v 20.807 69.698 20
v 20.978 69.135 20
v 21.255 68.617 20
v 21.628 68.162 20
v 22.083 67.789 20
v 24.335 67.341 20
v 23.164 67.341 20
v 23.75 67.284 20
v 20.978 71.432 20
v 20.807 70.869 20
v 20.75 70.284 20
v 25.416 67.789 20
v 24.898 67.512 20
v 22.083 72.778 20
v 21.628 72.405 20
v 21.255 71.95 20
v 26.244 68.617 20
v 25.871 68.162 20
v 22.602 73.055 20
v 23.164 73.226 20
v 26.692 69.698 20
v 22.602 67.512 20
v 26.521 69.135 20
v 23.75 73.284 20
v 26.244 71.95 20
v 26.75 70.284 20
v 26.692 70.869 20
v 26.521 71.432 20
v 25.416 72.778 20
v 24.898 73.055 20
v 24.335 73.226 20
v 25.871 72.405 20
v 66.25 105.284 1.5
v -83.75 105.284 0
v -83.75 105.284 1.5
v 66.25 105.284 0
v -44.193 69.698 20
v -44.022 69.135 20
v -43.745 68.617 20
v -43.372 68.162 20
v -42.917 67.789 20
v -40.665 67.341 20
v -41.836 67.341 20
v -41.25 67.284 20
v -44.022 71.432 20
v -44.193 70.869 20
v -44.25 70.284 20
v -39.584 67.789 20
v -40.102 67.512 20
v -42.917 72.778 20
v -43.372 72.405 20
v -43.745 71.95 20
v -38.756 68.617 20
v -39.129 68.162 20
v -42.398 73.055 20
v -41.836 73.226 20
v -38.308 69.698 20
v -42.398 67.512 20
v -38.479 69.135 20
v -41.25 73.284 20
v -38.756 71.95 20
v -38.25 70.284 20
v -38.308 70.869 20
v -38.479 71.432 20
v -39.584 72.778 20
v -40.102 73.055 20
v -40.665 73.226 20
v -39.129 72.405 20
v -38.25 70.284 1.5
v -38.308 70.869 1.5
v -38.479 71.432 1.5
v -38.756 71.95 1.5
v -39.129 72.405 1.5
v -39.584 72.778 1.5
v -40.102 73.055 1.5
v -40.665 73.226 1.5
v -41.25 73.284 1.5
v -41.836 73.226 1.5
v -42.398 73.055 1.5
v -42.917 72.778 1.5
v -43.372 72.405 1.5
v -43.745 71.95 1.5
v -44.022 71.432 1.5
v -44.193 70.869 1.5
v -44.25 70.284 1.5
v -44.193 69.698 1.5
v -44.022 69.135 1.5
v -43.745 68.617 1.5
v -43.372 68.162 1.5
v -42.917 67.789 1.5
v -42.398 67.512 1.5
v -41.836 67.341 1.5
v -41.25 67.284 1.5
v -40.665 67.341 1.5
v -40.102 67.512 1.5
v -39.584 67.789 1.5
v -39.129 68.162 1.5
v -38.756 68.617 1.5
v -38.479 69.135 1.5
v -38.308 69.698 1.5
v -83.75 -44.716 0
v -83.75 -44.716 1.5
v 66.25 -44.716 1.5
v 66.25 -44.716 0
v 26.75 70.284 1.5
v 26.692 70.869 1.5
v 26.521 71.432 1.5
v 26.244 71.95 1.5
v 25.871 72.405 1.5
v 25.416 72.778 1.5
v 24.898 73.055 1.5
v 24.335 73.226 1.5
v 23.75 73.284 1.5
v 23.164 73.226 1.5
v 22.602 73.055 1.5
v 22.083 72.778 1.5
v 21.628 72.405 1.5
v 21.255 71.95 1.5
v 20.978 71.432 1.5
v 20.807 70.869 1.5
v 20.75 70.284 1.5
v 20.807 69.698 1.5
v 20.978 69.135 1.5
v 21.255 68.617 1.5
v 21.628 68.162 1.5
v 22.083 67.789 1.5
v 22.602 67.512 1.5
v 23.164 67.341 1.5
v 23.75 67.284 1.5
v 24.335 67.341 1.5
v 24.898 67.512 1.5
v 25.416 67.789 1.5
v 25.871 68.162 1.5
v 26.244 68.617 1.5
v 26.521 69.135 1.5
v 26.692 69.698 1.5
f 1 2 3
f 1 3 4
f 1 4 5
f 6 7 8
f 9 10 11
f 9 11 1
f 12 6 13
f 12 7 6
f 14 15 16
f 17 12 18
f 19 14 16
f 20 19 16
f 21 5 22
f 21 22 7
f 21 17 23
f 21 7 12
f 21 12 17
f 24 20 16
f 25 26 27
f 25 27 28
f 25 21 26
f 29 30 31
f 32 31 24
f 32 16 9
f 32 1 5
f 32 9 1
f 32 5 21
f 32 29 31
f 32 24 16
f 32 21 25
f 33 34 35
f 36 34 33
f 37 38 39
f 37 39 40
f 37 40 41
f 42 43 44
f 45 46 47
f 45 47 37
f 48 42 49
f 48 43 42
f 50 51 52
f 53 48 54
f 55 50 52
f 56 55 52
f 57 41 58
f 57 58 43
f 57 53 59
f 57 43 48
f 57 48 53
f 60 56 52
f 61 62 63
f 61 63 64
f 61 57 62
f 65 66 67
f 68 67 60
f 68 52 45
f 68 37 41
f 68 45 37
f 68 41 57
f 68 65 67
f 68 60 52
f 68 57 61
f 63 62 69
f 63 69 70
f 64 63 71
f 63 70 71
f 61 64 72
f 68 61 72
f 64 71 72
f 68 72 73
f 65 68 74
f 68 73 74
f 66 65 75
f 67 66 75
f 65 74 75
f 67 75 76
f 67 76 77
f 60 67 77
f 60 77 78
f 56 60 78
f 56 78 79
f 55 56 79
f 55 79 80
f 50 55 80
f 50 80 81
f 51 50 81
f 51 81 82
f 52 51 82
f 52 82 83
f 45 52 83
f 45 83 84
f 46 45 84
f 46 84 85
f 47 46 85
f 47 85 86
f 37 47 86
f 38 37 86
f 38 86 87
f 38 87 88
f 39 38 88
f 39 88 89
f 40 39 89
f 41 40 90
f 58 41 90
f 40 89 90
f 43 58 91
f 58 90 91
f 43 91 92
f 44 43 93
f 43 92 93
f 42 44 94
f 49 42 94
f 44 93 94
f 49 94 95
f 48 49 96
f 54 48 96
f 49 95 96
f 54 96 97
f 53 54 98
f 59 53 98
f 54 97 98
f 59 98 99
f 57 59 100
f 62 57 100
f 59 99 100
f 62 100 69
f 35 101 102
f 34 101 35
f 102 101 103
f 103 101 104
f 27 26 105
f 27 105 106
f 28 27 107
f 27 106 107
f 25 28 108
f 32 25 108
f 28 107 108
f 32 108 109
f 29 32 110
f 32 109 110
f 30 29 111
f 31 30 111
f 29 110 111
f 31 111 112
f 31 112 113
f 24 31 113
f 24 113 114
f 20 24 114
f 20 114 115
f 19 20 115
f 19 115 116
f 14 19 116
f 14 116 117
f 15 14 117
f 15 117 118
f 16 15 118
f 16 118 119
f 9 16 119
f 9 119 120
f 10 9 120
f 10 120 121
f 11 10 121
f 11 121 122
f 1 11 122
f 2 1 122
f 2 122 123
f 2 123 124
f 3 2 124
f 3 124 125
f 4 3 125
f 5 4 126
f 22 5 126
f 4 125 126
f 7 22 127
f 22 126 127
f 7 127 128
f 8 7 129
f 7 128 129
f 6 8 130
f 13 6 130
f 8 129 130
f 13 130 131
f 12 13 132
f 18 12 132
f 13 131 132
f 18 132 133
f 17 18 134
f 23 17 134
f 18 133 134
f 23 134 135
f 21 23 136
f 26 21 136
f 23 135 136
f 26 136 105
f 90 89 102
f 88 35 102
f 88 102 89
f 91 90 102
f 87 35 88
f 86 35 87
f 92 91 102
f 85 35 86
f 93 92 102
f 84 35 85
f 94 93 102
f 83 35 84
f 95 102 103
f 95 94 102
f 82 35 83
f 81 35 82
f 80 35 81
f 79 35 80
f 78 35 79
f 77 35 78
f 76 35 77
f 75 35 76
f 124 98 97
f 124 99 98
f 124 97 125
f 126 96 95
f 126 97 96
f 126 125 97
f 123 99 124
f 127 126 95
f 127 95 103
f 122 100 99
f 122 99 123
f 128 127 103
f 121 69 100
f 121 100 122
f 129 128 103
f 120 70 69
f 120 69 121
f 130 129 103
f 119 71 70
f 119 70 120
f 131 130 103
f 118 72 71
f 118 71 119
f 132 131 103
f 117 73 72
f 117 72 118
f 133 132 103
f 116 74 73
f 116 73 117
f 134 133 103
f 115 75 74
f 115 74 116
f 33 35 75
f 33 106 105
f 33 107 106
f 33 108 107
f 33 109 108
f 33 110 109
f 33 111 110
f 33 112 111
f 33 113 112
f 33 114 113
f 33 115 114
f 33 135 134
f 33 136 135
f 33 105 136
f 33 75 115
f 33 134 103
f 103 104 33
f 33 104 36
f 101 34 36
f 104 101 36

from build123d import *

# Parameters (mm, degrees)
F0_W     = 150
F0_H     = 150
F0_R     = 3
F1_DEPTH = 1.5
F2_DEPTH = 20


with BuildPart() as f1:
    # F0 (on Top) → F1 (new body)
    with BuildSketch(Plane.XY):
        with Locations((-8.750431, 30.283519)):
            Rectangle(F0_W, F0_H)
        with Locations((-41.250431, 70.283519)):
            Circle(F0_R, mode=Mode.SUBTRACT)
        with Locations((23.749569, 70.283519)):
            Circle(F0_R, mode=Mode.SUBTRACT)
    extrude(amount=F1_DEPTH)

    # F0 (on Top) → F2 (join)
    with BuildSketch(Plane.XY):
        with Locations((-41.250431, 70.283519)):
            Circle(F0_R)
        with Locations((23.749569, 70.283519)):
            Circle(F0_R)
    extrude(amount=F2_DEPTH)


solid = f1.part
